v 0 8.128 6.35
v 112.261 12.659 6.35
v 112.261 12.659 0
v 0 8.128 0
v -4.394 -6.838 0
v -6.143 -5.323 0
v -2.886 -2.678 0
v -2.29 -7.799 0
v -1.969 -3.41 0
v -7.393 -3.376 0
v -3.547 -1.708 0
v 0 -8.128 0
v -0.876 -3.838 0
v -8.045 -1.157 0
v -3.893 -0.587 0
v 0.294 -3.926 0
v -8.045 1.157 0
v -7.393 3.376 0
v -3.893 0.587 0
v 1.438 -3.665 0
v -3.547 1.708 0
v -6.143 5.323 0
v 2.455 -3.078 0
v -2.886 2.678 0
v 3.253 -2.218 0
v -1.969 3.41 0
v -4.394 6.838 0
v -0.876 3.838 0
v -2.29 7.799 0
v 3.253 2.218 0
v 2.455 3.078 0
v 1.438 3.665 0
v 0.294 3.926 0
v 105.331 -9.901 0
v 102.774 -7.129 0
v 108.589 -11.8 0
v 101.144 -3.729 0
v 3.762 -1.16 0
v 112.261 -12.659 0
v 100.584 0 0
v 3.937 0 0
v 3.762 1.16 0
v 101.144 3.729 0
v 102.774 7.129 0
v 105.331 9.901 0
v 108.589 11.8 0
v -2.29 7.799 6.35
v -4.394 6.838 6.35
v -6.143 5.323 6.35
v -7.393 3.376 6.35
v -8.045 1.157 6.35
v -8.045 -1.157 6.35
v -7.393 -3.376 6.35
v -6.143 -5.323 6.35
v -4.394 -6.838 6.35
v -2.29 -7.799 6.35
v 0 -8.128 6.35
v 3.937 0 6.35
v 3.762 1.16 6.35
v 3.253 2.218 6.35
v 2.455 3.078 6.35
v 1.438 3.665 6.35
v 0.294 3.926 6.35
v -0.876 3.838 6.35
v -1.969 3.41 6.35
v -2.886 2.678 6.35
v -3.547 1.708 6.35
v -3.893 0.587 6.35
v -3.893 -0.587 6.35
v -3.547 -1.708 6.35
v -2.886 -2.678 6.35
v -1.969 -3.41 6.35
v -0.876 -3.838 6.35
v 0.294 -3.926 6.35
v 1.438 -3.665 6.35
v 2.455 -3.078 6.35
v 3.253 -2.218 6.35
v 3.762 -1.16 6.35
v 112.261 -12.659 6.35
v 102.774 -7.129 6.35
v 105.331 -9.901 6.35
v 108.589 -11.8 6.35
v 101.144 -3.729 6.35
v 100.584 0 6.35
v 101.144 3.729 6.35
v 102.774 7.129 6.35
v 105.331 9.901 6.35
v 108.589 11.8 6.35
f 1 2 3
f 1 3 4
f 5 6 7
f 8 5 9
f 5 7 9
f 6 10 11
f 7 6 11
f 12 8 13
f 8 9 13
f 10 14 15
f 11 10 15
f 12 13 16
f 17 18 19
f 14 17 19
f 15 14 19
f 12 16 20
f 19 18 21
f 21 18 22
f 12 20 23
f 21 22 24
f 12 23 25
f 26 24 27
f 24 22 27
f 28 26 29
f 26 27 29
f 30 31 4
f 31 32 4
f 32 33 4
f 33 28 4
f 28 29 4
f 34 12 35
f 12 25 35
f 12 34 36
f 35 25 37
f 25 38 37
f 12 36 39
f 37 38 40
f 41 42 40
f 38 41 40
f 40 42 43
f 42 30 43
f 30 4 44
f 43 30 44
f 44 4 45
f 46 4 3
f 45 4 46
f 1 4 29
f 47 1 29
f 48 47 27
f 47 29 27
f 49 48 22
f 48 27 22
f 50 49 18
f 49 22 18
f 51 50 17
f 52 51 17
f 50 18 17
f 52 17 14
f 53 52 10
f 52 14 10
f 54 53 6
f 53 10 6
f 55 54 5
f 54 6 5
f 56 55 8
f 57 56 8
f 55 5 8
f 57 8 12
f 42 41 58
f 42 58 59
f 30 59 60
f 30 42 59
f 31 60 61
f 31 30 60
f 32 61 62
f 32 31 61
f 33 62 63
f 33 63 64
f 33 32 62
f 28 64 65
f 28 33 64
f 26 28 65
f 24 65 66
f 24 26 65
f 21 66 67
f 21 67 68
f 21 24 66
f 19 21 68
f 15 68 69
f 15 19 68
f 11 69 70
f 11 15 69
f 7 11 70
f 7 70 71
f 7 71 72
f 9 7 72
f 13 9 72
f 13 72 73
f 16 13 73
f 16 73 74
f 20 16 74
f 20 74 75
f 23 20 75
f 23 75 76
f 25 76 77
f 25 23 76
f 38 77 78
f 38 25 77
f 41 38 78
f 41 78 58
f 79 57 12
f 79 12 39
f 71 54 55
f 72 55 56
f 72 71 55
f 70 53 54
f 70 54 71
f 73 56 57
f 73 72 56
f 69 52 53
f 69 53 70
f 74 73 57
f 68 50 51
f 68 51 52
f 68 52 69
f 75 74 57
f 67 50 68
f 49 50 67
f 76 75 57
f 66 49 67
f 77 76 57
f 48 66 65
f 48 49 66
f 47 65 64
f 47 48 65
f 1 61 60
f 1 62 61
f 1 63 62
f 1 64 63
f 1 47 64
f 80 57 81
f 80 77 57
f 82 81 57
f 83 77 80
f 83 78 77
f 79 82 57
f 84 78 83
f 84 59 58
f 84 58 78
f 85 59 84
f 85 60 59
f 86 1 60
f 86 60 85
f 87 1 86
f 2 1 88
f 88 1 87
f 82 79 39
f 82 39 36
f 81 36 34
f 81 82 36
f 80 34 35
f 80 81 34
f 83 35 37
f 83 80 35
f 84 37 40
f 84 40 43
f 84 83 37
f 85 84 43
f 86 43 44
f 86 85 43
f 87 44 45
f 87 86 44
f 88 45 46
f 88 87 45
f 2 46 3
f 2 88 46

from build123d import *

# Parameters (mm, degrees)
SKETCH1_R           = 8.128
SKETCH1_R_2         = 3.937
BOSS_EXTRUDE1_DEPTH = 6.35
BOSS_EXTRUDE2_DEPTH = 6.35


with BuildPart() as part:
    # Sketch1 → Boss-Extrude1 (new body)
    with BuildSketch(Plane.XY):
        Circle(SKETCH1_R)
        Circle(SKETCH1_R_2, mode=Mode.SUBTRACT)
    extrude(amount=BOSS_EXTRUDE1_DEPTH)

    # Sketch2 → Boss-Extrude2 (add)
    with BuildSketch(Plane.XY.offset(6.35)):
        with BuildLine():
            Line((112.260554909, 12.658695041), (0, 8.128))
            ThreePointArc((0, 8.128), (5.747363917, 5.747363917), (8.128, 0))
            ThreePointArc((8.128, 0), (5.747363917, -5.747363917), (0, -8.128))
            Line((0, -8.128), (112.260554909, -12.658695041))
            ThreePointArc((112.260554909, -12.658695041), (100.584, 0), (112.260554909, 12.658695041))
        make_face()
    extrude(amount=-BOSS_EXTRUDE2_DEPTH)


solid = part.part
